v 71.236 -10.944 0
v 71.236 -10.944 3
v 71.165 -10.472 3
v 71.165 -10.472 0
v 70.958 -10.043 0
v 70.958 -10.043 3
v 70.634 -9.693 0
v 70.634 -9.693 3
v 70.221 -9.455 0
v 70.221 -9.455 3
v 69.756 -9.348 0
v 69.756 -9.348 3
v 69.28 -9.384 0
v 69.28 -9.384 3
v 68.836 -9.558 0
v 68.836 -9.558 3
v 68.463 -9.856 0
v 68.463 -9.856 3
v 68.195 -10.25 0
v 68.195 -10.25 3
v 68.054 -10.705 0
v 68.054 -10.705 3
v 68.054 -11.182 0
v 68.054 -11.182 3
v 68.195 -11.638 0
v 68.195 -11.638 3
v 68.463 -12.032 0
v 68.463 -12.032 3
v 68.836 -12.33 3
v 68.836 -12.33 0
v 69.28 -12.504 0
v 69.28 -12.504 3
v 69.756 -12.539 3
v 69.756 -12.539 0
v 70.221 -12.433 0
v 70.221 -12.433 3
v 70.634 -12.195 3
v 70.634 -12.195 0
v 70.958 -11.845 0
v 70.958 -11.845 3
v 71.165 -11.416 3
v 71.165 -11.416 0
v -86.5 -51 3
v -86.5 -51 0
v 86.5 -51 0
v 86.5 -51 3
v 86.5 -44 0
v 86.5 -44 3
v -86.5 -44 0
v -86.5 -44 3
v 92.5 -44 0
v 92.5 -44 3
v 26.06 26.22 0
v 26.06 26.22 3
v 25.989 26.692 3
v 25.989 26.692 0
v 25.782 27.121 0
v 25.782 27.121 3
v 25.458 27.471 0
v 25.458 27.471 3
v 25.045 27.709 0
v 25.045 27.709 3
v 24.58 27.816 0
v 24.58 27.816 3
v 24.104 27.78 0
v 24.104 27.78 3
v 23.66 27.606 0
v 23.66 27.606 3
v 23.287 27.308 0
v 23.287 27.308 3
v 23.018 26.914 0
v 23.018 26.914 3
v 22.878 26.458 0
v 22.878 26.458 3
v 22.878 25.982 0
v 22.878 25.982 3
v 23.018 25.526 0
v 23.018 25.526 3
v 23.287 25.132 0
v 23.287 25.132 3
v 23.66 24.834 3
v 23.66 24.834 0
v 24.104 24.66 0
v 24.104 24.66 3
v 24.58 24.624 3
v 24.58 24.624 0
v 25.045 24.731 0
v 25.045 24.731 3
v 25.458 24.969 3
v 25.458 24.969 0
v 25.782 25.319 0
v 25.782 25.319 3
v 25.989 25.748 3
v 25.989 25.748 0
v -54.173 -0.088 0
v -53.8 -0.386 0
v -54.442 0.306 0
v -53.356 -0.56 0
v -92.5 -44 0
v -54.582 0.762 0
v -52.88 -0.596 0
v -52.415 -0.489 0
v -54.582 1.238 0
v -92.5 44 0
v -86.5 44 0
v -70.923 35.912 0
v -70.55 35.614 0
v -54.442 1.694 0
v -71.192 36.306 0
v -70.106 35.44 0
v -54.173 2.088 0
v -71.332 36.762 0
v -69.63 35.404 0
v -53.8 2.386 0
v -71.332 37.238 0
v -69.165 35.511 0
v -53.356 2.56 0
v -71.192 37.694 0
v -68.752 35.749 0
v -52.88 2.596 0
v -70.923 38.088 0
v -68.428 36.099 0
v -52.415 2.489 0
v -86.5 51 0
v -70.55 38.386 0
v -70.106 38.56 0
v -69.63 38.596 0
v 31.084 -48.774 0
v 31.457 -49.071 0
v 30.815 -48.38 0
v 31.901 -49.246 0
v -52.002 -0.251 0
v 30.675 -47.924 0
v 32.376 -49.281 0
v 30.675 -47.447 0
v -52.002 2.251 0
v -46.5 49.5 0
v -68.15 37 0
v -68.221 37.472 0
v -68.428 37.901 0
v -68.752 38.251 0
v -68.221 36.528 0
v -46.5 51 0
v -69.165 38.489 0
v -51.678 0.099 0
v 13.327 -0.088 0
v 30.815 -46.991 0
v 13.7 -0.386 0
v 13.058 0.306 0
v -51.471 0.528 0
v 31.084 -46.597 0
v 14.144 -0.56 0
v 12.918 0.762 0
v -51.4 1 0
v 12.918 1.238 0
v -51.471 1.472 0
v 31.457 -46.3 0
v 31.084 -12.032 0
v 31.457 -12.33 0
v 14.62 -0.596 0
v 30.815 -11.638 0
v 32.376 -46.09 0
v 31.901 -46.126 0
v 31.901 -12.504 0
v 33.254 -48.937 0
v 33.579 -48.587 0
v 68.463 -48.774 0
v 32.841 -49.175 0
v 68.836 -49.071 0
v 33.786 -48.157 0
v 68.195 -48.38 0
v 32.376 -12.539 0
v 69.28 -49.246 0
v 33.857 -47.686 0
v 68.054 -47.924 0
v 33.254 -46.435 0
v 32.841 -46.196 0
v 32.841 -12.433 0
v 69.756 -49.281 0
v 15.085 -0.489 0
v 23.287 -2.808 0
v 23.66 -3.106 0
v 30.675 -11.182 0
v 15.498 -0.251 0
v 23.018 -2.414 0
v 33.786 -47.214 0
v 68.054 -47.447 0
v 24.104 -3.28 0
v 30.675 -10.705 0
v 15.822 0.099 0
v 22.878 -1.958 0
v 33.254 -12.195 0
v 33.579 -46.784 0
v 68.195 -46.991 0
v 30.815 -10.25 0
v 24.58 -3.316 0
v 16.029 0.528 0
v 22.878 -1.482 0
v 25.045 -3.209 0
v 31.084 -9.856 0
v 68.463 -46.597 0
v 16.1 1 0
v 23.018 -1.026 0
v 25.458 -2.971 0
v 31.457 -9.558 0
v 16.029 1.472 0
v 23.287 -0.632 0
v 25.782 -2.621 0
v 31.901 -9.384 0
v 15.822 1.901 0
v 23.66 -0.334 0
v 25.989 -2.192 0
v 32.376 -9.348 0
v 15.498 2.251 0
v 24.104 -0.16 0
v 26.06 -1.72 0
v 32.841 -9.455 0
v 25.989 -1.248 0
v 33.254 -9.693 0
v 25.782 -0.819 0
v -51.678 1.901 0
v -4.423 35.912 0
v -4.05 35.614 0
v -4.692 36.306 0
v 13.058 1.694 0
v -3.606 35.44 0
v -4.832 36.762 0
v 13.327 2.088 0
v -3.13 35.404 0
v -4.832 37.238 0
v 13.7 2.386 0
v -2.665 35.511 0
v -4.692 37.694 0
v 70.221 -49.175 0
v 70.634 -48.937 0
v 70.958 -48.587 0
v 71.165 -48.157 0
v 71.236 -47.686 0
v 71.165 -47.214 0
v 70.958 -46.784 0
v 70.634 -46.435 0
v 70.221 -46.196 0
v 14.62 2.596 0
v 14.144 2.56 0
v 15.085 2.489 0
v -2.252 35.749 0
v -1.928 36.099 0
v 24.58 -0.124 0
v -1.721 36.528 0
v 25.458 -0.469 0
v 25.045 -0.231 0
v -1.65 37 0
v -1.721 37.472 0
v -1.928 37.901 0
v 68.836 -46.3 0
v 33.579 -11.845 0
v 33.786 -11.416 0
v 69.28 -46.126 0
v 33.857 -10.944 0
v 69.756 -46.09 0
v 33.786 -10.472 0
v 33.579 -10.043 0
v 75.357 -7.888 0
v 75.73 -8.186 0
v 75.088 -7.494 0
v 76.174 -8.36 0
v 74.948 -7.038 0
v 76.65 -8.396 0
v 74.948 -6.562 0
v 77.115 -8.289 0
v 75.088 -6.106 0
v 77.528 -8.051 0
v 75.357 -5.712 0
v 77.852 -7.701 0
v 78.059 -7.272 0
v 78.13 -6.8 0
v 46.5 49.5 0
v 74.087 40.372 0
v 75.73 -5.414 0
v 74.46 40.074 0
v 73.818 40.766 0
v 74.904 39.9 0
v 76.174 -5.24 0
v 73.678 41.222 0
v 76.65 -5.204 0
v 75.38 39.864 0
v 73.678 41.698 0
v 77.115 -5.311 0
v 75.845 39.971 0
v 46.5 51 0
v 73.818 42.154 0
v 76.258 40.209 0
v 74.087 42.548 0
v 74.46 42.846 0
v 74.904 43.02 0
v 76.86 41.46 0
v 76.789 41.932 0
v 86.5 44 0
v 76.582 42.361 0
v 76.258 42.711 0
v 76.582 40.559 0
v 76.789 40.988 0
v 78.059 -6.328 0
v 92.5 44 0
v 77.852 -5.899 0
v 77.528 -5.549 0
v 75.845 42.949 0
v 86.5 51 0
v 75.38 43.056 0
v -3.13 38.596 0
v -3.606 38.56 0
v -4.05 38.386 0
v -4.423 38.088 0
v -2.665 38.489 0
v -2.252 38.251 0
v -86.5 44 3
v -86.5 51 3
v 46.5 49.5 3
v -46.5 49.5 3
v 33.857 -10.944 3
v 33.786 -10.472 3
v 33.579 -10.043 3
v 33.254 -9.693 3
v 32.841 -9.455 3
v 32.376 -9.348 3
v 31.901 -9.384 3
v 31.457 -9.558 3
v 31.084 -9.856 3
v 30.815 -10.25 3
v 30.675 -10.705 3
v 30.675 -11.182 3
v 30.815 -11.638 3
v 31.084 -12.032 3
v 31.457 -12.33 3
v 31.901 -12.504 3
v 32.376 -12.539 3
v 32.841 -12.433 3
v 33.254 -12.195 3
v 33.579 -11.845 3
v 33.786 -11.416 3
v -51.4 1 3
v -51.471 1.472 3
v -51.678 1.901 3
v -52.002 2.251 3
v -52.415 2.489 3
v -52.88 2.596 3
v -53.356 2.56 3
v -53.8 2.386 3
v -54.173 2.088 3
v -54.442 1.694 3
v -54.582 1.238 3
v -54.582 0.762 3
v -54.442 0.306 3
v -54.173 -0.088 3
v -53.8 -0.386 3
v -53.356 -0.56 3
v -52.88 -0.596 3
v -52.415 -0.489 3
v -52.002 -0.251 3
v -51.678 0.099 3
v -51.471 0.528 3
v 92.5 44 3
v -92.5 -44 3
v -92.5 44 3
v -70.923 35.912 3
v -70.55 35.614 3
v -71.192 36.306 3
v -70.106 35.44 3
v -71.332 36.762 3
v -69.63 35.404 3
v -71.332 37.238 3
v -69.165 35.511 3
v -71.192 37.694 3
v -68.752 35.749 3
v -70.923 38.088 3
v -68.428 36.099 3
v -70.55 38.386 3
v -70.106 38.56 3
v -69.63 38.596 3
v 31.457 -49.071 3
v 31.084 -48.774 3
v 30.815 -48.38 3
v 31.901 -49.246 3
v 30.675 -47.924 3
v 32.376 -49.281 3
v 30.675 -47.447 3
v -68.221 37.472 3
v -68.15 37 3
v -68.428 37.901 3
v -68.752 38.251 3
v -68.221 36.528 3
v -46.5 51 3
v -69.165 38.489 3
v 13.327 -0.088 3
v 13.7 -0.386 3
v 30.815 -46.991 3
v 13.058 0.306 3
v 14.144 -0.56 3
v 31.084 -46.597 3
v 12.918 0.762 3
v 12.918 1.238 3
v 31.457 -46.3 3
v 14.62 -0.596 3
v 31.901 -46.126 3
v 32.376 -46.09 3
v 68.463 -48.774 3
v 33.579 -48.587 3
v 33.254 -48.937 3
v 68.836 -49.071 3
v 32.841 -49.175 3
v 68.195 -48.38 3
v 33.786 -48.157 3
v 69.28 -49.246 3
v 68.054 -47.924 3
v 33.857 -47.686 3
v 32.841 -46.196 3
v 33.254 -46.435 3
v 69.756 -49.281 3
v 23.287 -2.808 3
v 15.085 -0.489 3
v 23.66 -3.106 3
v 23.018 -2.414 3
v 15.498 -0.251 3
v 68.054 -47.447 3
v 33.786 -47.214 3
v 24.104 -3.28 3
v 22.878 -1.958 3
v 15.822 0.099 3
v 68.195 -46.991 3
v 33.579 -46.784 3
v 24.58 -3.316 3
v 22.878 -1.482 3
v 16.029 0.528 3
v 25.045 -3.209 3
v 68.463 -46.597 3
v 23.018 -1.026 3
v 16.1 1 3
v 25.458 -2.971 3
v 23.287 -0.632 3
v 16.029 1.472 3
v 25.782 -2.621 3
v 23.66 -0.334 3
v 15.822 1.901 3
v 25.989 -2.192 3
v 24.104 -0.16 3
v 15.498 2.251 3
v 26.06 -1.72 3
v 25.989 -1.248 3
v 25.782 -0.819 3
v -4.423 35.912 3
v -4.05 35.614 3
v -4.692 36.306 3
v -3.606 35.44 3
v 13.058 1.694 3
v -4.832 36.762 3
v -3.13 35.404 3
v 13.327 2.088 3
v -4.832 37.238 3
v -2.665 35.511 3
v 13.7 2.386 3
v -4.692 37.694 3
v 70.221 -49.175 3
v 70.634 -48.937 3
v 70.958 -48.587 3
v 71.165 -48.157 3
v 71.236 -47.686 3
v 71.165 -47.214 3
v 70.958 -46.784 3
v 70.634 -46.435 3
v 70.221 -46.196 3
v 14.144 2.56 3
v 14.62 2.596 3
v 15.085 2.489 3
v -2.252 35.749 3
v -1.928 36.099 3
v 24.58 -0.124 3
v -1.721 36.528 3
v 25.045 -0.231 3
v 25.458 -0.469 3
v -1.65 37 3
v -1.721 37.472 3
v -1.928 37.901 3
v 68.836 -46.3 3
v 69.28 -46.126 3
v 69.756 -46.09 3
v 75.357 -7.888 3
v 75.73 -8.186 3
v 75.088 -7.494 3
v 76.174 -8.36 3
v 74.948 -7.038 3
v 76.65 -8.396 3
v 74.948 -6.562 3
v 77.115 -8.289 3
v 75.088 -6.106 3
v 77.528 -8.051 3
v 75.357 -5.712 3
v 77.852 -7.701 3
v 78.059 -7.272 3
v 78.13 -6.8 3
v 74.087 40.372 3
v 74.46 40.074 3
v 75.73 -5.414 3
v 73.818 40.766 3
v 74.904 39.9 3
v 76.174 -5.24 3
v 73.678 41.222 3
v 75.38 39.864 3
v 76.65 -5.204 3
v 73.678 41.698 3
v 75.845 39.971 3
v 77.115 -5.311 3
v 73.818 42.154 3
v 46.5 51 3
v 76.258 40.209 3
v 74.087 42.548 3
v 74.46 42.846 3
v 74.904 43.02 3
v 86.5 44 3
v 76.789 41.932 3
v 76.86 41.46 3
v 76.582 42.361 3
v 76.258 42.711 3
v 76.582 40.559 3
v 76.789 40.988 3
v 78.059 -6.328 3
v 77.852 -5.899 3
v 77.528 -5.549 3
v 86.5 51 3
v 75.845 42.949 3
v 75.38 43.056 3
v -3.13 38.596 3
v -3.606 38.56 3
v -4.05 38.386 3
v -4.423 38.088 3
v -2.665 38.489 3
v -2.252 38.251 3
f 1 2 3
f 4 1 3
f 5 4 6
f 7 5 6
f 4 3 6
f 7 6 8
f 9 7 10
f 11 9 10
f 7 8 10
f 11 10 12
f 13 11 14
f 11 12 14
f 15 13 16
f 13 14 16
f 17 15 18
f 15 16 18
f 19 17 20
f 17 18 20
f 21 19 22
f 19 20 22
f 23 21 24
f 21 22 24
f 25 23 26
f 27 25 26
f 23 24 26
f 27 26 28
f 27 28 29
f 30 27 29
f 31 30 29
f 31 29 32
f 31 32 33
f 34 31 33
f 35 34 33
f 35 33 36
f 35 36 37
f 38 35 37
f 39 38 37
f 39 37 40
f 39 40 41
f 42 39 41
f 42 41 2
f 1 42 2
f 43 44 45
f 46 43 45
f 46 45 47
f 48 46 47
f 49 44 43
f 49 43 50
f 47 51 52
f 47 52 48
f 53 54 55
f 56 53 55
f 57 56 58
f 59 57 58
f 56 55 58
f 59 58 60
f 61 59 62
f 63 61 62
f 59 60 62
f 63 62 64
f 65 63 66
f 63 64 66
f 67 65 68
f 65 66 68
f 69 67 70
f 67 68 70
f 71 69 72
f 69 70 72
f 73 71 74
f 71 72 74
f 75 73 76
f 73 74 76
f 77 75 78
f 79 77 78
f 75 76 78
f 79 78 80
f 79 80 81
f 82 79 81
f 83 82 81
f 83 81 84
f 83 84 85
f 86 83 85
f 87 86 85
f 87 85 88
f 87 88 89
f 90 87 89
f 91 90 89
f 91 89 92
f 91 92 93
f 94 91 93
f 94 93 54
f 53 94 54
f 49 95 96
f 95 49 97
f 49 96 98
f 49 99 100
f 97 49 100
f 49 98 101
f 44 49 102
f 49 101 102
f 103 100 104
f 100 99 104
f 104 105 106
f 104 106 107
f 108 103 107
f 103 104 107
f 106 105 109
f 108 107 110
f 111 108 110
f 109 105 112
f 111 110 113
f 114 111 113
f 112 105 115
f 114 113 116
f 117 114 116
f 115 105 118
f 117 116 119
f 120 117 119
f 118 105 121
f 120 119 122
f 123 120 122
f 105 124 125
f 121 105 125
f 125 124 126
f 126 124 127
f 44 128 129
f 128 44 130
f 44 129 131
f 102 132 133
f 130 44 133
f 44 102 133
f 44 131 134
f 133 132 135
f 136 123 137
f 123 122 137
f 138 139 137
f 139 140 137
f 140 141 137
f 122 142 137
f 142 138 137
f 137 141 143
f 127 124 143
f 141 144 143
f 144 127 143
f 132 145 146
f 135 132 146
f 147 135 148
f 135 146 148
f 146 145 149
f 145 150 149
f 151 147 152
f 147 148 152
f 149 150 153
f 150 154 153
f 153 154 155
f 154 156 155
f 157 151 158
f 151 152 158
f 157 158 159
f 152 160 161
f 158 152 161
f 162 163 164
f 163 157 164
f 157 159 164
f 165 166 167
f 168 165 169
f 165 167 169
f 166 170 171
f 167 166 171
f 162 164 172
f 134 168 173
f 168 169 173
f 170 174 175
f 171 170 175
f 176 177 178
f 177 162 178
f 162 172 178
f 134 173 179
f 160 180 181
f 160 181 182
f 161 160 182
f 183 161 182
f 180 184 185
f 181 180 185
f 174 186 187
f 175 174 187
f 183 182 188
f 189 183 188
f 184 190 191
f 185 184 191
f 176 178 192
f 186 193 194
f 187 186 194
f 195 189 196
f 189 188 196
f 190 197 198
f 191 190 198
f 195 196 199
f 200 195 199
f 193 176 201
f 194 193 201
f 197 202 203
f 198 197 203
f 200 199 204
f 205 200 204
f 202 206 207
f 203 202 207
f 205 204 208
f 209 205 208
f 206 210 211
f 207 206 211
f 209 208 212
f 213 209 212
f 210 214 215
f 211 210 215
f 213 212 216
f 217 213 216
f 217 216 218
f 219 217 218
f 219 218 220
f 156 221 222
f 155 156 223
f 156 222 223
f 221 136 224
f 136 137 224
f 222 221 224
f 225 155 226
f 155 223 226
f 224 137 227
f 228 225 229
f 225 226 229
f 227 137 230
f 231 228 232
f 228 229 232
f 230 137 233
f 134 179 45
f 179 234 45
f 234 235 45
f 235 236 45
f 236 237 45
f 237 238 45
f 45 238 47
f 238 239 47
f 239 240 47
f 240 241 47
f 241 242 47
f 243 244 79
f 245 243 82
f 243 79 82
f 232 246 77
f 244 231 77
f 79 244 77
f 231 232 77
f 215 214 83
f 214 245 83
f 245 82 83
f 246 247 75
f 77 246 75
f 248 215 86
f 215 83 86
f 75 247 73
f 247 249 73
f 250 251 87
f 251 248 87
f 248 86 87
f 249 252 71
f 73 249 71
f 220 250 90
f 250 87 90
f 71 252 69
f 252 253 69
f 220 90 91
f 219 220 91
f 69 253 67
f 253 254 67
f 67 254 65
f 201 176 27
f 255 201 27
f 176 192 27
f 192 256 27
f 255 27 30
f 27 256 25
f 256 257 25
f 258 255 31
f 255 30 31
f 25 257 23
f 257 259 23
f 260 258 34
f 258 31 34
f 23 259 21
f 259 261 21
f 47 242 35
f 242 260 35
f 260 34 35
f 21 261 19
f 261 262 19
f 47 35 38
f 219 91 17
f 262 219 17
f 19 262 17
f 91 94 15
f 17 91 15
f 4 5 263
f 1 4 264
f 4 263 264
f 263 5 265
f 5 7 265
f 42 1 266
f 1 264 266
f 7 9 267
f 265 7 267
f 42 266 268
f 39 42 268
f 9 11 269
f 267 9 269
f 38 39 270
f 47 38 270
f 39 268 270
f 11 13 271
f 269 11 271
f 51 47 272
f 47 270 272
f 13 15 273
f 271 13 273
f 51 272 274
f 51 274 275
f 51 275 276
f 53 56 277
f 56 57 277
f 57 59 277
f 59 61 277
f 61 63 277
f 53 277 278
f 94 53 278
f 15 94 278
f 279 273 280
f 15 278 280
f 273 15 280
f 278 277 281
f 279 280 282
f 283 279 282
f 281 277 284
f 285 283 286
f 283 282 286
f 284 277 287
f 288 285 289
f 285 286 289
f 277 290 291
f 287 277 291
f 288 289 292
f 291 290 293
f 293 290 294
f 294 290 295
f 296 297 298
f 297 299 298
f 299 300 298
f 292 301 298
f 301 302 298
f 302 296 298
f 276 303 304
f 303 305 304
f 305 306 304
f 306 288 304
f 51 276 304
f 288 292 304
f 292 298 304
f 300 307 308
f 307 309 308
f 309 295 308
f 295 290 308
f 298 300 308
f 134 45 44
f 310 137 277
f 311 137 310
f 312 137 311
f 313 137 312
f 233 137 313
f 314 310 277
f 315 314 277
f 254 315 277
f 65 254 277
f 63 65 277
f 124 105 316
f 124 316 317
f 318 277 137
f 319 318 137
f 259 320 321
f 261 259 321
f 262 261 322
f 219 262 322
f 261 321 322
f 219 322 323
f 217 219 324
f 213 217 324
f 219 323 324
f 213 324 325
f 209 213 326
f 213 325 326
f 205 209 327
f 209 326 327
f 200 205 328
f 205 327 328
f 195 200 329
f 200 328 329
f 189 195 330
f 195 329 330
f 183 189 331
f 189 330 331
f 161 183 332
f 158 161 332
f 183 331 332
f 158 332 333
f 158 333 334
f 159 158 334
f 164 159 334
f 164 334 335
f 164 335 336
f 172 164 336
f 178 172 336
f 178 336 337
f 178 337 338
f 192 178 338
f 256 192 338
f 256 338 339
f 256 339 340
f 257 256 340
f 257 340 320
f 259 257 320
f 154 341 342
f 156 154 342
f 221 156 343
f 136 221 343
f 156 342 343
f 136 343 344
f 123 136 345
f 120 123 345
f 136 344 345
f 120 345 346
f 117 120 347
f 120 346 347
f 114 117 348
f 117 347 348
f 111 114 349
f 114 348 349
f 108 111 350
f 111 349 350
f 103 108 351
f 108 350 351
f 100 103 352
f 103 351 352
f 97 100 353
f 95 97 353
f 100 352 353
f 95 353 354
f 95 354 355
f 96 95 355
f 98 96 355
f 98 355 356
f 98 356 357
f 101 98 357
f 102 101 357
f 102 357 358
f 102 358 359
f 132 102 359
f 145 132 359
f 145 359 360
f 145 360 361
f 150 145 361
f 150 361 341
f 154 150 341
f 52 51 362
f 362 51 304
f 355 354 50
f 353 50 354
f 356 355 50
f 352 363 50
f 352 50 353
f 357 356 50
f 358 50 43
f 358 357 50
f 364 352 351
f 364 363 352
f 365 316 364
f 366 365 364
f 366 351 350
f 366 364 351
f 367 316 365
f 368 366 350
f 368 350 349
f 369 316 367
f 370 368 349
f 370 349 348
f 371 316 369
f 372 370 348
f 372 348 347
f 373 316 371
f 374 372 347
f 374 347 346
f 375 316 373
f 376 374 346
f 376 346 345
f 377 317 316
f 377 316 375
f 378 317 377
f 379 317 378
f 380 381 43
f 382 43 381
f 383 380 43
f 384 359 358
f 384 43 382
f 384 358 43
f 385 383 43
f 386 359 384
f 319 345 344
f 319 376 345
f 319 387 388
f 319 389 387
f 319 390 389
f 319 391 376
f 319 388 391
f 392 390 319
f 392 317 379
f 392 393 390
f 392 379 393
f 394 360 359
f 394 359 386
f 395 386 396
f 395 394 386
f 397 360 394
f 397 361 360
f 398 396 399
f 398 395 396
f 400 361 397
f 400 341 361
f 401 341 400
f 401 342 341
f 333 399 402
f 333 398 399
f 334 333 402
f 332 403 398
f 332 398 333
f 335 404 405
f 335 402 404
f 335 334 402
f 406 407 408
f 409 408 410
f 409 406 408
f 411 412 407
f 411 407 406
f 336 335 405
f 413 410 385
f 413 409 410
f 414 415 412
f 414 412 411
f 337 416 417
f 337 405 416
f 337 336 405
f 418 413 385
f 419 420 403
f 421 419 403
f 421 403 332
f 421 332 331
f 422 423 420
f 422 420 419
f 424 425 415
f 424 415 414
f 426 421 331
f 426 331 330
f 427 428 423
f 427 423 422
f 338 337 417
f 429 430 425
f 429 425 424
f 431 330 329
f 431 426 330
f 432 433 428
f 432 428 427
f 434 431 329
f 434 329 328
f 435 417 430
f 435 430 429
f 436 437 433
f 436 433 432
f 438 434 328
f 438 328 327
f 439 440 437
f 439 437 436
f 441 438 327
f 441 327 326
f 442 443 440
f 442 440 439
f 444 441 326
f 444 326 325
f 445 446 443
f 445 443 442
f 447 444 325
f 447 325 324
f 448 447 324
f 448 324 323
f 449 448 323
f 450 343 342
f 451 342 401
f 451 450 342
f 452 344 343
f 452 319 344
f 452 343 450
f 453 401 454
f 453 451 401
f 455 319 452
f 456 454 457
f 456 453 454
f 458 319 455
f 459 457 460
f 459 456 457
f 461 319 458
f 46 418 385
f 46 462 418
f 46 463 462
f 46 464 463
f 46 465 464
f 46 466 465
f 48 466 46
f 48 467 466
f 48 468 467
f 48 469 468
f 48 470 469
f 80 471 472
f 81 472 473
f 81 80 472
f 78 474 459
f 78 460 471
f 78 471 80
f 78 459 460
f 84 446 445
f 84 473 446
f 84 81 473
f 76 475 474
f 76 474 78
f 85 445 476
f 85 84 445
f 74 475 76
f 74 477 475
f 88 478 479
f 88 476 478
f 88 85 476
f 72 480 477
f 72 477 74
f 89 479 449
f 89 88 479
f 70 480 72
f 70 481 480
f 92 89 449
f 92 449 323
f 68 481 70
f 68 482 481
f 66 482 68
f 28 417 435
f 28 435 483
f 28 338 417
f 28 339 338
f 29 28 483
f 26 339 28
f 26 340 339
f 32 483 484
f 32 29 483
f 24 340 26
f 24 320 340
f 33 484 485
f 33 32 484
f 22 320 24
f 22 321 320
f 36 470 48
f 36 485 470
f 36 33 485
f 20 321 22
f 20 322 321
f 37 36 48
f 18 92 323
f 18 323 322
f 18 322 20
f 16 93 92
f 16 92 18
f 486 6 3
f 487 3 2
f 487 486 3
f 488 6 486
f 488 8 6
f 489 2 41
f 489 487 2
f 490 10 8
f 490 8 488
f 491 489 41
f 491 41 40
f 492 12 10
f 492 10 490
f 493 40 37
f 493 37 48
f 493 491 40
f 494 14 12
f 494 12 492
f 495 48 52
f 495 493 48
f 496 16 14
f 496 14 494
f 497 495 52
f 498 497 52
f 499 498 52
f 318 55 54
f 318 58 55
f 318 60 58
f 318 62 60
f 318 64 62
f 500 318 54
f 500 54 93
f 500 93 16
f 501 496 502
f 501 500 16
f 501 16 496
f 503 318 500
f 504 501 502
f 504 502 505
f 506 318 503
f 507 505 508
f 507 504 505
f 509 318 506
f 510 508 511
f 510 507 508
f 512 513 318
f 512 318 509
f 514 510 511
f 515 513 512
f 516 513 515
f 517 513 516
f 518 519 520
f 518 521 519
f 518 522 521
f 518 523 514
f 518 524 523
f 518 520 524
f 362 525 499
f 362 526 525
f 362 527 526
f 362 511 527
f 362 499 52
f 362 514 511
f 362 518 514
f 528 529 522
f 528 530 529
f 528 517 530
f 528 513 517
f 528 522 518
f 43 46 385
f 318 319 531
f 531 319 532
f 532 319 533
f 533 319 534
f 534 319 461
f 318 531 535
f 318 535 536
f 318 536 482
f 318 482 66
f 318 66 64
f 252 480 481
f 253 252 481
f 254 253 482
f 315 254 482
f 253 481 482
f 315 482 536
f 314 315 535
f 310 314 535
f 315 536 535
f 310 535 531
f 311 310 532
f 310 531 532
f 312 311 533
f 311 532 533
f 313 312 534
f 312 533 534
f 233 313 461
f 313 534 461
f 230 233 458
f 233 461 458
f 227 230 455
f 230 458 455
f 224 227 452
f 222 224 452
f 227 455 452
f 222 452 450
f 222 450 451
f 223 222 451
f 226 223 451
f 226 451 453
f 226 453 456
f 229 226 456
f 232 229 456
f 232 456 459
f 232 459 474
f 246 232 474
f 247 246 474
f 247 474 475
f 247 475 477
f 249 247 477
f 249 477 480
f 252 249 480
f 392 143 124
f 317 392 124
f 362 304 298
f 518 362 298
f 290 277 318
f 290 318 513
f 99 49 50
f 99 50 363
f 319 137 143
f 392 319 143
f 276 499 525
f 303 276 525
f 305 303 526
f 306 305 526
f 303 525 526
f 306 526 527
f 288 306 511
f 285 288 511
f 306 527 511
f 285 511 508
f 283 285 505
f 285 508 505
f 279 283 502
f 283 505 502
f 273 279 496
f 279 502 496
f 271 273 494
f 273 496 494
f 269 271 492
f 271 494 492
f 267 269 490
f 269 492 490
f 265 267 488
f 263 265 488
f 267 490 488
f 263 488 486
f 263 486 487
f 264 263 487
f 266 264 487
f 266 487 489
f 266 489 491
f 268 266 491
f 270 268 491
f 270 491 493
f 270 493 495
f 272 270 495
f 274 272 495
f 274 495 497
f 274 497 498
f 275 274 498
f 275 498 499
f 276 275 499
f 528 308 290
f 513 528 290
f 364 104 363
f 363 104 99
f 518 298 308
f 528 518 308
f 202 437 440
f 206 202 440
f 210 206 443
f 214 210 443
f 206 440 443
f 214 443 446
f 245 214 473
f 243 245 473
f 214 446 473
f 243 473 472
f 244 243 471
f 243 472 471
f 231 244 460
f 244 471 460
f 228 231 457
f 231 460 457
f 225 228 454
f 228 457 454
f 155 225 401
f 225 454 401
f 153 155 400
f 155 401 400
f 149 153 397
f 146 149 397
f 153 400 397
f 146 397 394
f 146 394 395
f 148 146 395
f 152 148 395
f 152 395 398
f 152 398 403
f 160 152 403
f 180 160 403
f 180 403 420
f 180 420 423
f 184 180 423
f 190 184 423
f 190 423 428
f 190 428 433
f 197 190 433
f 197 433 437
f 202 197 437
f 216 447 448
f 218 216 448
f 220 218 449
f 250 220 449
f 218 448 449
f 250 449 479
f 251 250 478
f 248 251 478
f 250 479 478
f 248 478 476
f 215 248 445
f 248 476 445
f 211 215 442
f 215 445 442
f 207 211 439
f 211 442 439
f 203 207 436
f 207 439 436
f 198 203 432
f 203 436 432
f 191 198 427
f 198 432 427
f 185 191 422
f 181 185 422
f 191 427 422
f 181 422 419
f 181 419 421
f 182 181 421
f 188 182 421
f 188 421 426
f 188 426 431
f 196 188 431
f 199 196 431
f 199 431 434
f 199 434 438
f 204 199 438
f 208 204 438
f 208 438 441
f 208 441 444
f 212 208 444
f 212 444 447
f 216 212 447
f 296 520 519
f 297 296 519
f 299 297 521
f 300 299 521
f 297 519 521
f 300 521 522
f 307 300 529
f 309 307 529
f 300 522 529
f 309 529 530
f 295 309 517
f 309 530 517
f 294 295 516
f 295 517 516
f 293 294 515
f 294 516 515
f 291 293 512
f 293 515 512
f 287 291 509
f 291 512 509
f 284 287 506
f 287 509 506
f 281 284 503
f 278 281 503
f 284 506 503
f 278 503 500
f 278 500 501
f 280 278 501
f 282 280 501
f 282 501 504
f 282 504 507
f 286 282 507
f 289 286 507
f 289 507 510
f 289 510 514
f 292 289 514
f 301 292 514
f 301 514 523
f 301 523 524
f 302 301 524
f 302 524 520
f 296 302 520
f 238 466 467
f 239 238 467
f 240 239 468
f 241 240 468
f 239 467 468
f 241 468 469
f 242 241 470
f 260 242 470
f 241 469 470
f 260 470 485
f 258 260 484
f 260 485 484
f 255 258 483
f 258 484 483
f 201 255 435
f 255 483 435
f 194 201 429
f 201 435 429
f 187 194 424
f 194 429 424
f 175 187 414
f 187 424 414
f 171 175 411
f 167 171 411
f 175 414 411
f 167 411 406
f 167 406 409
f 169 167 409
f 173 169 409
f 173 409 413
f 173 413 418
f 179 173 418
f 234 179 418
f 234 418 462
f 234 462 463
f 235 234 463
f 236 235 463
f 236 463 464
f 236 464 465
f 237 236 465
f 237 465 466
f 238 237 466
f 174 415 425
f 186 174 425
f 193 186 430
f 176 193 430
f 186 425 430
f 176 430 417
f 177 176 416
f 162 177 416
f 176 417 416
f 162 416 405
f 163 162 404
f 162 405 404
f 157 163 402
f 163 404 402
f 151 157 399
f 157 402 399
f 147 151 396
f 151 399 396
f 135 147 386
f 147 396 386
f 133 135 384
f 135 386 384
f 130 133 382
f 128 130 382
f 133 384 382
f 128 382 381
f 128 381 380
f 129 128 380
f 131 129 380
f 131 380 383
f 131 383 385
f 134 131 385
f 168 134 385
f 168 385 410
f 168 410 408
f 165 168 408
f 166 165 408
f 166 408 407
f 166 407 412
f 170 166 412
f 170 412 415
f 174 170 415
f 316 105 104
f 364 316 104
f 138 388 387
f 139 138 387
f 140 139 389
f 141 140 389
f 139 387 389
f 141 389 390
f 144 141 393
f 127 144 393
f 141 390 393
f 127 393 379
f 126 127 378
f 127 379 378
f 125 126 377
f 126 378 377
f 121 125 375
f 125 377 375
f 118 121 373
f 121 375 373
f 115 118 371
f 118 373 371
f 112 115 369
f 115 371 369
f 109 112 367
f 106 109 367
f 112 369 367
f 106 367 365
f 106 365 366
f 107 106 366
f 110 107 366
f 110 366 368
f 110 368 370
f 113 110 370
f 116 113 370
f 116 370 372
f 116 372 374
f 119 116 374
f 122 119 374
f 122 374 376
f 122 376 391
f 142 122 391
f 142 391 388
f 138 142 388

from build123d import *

# Parameters (mm, degrees)
EXTRUDE_1_DEPTH     = 3
HOLE_WIZARD_M31_D   = 3.2
SKETCH_6_W          = 6.5
SKETCH_6_H          = 7
CUT_EXTRUDE_1_DEPTH = 106.670478375
SKETCH_7_W          = 93
SKETCH_7_H          = 1.5
CUT_EXTRUDE_2_DEPTH = 106.670478375


with BuildPart() as part:
    # Эскиз1 → Бобышка-Вытянуть1 (new body)
    with BuildSketch(Plane.XY):
        with BuildLine():
            Line((92.5, -51), (92.5, -48.698957881))
            ThreePointArc((92.5, -48.698957881), (86.75, -47.5), (92.5, -46.301042119))
            Line((92.5, -46.301042119), (92.5, 46.301042119))
            ThreePointArc((92.5, 46.301042119), (86.75, 47.5), (92.5, 48.698957881))
            Line((92.5, 48.698957881), (92.5, 51))
            Line((92.5, 51), (-92.5, 51))
            Line((-92.5, 51), (-92.5, 48.698957881))
            ThreePointArc((-92.5, 48.698957881), (-86.75, 47.5), (-92.5, 46.301042119))
            Line((-92.5, 46.301042119), (-92.5, -46.301042119))
            ThreePointArc((-92.5, -46.301042119), (-86.75, -47.5), (-92.5, -48.698957881))
            Line((-92.5, -48.698957881), (-92.5, -51))
            Line((-92.5, -51), (92.5, -51))
        make_face()
    extrude(amount=EXTRUDE_1_DEPTH)

    # Отверстие с зазором M31 (through all)
    with Locations(Plane(origin=(0, 0, 0), x_dir=(-1, 0, 0), z_dir=(0, 0, -1))):
        with Locations((-76.53, -6.8), (-24.46, -1.72), (-24.46, 26.22), (-75.26, 41.46), (-69.63631327, -47.68571173), (-69.63631327, -10.94391141), (-32.25681239, -10.94391141), (-32.25681239, -47.68571173), (-14.5, 1), (53, 1), (3.25, 37), (69.75, 37)):
            Hole(HOLE_WIZARD_M31_D / 2)

    # Эскиз6 → Вырез-Вытянуть1 (cut, through all)
    with BuildSketch(Plane(origin=(0, 0, 0), x_dir=(-1, 0, 0), z_dir=(0, 0, -1))):
        with Locations((-89.75, 47.5)):
            Rectangle(SKETCH_6_W, SKETCH_6_H)
        with Locations((89.75, 47.5)):
            Rectangle(SKETCH_6_W, SKETCH_6_H)
        with Locations((89.75, -47.5)):
            Rectangle(SKETCH_6_W, SKETCH_6_H)
        with Locations((-89.75, -47.5)):
            Rectangle(SKETCH_6_W, SKETCH_6_H)
    extrude(amount=-CUT_EXTRUDE_1_DEPTH, mode=Mode.SUBTRACT)

    # Эскиз7 → Вырез-Вытянуть2 (cut, through all)
    with BuildSketch(Plane(origin=(0, 0, 0), x_dir=(-1, 0, 0), z_dir=(0, 0, -1))):
        with Locations((0, 50.25)):
            Rectangle(SKETCH_7_W, SKETCH_7_H)
    extrude(amount=-CUT_EXTRUDE_2_DEPTH, mode=Mode.SUBTRACT)


solid = part.part
